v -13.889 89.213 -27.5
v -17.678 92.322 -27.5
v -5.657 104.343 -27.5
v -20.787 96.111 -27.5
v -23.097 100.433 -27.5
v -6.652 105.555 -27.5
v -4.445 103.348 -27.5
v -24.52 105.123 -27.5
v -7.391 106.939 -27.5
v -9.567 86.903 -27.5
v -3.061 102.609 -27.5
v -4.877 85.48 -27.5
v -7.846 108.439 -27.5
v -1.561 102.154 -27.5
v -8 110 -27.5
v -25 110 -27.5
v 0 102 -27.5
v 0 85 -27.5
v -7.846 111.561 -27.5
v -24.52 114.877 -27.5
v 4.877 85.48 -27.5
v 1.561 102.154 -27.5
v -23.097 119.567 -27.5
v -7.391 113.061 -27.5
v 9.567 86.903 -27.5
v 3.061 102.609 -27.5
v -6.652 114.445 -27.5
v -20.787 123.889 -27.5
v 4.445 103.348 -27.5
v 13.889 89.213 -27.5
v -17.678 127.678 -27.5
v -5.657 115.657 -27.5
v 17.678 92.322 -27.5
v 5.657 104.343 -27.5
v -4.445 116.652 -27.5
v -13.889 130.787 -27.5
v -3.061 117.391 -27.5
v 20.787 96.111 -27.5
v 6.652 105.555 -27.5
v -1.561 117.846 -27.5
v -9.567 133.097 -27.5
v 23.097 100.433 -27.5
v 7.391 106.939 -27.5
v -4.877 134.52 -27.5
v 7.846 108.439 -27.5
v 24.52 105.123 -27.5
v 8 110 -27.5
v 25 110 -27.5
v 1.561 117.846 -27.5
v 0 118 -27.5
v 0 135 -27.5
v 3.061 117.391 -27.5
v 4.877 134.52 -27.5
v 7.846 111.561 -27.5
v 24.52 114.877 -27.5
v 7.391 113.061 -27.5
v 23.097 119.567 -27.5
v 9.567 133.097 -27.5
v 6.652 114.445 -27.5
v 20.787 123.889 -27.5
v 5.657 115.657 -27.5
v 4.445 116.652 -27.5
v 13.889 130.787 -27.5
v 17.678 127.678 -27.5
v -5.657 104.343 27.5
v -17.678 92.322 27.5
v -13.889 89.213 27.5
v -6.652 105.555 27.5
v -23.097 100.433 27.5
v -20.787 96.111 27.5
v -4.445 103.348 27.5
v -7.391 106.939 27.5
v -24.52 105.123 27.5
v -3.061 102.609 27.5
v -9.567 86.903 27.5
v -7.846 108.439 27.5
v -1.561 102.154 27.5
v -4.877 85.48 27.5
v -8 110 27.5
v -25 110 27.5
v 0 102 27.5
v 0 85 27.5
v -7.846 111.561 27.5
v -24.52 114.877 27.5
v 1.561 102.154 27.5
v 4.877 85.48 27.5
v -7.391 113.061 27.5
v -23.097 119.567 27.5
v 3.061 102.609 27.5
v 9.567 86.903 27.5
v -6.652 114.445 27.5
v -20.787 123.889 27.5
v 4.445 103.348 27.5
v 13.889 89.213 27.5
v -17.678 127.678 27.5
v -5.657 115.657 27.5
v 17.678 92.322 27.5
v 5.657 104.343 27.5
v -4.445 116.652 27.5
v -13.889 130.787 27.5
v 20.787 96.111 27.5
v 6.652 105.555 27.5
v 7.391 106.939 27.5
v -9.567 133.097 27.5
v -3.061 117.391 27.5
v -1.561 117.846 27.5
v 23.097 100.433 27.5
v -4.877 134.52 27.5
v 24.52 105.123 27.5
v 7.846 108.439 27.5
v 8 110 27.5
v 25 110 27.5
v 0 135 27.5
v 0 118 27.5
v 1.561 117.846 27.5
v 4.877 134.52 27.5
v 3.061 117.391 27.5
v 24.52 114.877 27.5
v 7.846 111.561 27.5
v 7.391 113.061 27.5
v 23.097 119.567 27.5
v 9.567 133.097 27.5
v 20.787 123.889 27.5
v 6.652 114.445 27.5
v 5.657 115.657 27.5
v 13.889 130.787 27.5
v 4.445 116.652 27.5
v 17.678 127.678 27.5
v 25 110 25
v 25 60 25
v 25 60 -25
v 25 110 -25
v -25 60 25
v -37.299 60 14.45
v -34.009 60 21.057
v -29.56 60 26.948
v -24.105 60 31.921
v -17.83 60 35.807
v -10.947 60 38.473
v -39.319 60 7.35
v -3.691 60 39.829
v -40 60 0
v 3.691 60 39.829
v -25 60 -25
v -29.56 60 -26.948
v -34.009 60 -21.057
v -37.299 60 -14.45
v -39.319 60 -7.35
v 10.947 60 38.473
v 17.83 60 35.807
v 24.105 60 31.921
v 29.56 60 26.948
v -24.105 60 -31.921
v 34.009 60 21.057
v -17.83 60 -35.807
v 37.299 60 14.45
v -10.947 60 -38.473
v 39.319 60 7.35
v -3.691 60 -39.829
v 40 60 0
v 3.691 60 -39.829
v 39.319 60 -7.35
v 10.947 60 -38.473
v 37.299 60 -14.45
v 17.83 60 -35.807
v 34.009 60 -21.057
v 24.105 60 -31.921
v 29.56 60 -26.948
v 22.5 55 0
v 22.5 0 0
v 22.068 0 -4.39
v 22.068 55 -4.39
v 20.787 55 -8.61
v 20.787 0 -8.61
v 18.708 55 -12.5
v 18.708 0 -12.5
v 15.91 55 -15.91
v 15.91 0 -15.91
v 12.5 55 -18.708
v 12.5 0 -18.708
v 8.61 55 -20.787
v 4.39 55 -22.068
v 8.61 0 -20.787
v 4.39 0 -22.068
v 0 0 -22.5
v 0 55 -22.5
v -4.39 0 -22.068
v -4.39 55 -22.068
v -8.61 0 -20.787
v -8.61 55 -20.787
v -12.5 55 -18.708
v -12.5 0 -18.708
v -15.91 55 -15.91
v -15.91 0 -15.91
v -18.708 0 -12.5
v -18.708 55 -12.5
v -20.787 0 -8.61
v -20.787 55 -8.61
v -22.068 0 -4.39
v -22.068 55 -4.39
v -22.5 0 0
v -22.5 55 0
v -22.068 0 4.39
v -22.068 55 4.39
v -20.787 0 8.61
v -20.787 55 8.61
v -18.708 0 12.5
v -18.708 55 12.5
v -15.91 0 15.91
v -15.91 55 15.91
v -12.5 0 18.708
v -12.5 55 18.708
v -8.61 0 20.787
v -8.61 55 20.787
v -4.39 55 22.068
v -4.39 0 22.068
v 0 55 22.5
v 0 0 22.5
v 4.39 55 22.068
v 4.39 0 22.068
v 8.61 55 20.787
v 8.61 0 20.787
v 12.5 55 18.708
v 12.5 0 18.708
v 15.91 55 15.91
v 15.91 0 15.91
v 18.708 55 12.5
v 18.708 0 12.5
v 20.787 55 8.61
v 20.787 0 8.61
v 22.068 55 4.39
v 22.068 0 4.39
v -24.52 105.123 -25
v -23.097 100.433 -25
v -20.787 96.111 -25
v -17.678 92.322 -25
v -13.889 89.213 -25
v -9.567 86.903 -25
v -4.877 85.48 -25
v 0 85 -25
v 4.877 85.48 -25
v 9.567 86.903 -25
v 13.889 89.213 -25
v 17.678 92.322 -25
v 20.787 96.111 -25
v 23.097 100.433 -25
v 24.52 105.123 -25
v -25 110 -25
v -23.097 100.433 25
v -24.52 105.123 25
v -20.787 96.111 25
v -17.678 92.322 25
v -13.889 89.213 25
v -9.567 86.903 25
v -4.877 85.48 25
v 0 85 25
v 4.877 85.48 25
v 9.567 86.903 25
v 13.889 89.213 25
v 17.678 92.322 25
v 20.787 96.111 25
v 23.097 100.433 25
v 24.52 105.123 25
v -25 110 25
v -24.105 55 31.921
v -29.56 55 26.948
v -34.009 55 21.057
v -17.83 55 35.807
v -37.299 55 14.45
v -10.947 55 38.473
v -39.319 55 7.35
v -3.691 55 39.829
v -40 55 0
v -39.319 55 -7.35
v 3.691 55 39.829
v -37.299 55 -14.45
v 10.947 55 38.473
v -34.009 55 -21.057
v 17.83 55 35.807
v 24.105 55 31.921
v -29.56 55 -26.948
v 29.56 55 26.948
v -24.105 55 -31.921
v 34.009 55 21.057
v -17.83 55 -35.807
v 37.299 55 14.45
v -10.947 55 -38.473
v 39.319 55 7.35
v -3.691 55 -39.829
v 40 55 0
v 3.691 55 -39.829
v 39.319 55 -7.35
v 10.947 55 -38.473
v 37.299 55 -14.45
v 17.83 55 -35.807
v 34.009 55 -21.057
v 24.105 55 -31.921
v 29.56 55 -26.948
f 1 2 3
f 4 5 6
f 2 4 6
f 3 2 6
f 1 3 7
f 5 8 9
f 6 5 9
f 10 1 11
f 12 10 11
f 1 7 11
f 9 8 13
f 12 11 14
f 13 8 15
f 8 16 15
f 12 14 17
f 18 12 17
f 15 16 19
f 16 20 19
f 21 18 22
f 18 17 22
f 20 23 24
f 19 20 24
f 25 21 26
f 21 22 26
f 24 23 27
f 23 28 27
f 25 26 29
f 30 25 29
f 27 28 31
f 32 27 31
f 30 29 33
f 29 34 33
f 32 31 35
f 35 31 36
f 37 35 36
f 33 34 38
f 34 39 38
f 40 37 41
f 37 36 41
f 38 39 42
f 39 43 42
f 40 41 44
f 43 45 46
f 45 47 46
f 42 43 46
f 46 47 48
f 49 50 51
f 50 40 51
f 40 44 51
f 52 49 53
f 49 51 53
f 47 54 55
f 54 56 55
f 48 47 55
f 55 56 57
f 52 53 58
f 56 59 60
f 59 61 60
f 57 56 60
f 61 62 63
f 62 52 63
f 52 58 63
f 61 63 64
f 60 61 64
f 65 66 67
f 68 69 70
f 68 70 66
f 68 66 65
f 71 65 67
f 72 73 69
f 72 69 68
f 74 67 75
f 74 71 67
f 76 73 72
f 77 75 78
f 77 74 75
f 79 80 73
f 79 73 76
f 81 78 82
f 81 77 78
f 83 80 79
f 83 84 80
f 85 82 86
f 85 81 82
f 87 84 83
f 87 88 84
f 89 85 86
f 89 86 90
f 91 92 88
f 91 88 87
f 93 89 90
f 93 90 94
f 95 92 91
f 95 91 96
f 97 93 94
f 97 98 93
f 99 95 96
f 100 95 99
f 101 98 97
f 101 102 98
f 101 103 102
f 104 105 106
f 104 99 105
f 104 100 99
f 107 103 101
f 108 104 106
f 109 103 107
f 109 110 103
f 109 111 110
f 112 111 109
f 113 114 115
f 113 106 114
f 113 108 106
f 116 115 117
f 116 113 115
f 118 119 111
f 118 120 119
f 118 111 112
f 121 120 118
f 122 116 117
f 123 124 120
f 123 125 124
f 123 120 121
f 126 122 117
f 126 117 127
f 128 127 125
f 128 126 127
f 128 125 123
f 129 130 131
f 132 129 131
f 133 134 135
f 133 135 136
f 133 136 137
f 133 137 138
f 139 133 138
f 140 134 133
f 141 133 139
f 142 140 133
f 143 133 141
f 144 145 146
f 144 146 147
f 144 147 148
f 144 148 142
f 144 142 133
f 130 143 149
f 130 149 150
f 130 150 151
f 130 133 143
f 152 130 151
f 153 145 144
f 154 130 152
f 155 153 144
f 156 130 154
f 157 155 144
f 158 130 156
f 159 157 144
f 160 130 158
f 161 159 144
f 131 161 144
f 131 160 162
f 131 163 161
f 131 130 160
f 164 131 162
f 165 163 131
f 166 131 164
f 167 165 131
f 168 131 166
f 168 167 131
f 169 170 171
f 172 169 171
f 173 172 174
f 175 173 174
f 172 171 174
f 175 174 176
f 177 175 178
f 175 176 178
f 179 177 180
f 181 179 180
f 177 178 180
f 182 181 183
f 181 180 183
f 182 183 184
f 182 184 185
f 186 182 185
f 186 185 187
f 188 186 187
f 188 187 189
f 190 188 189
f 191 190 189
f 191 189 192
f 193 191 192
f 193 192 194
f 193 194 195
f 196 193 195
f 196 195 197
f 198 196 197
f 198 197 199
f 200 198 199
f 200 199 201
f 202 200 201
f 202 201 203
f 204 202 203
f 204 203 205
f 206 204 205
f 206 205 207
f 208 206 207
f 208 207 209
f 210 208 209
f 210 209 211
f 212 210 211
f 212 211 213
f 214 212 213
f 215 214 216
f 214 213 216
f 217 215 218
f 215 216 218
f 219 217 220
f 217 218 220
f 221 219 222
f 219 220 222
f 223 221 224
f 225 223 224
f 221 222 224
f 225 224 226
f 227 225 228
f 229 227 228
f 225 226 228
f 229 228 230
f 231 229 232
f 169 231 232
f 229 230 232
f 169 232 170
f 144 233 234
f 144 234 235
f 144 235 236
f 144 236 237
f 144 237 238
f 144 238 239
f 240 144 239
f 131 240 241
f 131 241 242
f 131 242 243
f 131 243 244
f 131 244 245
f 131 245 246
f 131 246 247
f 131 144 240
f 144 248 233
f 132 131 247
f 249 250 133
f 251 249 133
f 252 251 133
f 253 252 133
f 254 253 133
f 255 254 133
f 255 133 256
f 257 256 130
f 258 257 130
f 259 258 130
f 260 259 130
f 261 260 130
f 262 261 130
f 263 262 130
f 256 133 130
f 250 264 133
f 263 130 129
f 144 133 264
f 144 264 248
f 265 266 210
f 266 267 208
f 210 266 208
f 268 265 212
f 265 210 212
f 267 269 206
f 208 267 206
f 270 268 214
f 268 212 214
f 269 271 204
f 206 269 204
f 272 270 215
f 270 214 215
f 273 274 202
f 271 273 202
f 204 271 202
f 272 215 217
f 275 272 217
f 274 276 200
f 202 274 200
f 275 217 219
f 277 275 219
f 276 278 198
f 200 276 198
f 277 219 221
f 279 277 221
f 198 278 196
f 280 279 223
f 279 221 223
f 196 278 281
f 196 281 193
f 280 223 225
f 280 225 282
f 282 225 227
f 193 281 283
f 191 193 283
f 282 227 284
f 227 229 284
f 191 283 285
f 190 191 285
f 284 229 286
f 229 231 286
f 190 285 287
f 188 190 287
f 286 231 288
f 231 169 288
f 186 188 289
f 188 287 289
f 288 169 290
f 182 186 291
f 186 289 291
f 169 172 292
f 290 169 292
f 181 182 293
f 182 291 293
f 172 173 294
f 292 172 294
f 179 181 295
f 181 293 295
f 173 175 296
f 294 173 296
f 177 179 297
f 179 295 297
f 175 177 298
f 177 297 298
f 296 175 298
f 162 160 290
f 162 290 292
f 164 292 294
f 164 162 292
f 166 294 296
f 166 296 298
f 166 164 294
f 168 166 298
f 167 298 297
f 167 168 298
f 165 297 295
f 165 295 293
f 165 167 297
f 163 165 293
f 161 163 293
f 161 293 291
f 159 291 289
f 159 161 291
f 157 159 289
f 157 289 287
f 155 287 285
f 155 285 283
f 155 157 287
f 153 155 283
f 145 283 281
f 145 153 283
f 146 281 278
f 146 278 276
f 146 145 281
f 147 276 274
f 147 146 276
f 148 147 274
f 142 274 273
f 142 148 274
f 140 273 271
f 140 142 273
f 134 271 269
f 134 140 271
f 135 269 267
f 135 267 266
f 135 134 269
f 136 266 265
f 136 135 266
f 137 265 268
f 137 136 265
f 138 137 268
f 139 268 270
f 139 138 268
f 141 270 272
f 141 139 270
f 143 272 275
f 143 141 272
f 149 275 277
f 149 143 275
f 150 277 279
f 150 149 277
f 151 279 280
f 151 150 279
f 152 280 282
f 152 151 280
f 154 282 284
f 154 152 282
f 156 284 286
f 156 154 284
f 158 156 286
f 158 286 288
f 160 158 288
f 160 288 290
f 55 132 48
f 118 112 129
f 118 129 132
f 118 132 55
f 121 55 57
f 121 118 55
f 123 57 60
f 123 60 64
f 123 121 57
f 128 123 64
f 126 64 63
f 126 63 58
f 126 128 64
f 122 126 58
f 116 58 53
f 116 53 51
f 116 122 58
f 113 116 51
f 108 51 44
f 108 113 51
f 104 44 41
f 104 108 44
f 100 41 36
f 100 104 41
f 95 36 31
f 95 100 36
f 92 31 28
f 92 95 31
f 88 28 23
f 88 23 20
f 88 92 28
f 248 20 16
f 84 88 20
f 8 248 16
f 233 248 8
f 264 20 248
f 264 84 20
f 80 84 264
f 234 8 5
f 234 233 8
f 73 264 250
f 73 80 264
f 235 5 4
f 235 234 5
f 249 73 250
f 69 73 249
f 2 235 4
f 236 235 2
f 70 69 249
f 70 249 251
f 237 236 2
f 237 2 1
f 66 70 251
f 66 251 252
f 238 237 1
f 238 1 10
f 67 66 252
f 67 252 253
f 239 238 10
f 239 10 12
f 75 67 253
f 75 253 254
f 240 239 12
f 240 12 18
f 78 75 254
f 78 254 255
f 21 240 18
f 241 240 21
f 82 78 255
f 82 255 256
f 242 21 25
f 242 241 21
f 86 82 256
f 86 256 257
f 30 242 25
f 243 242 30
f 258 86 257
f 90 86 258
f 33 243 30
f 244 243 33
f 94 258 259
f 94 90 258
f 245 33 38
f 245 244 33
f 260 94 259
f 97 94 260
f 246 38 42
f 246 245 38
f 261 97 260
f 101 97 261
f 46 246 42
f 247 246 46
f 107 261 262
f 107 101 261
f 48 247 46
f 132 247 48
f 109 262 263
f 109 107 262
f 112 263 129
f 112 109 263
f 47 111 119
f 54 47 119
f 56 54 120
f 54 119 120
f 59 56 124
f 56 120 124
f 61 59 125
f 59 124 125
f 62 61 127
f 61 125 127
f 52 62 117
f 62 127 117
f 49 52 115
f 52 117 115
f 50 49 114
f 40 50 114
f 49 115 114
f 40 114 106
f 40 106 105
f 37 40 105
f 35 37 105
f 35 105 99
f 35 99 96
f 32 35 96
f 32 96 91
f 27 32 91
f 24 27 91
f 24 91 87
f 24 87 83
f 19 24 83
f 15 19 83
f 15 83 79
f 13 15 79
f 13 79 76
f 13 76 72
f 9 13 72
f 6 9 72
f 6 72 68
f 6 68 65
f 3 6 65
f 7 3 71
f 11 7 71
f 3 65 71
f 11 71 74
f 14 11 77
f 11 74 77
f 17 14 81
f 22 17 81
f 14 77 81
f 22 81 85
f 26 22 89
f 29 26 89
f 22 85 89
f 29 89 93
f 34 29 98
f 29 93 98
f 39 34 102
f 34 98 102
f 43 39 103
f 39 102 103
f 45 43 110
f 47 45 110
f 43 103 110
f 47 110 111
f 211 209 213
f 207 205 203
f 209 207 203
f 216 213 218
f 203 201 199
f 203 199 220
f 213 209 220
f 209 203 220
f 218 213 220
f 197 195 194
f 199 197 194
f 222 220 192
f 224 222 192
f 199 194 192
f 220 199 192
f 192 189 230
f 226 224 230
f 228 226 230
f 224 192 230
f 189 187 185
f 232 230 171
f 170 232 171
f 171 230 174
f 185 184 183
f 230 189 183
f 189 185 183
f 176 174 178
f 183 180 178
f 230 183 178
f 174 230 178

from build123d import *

# Parameters (mm, degrees)
IZIM1_R                     = 22.5
Y_KSEKLIK_EKSTR_ZYON1_DEPTH = 60
IZIM2_R                     = 40
IZIM2_R_2                   = 22.5
Y_KSEKLIK_EKSTR_ZYON2_DEPTH = 5
IZIM3_W                     = 50
IZIM3_H                     = 50
Y_KSEKLIK_EKSTR_ZYON3_DEPTH = 50
IZIM4_R                     = 25
Y_KSEKLIK_EKSTR_ZYON4_DEPTH = 27.5
IZIM5_R                     = 8
KES_EKSTR_ZYON1_DEPTH       = 68.5


with BuildPart() as part:
    # Çizim1 → Yükseklik-Ekstrüzyon1 (new body)
    with BuildSketch(Plane(origin=(0, 0, 0), x_dir=(1, 0, 0), z_dir=(0, 1, 0))):
        Circle(IZIM1_R)
    extrude(amount=Y_KSEKLIK_EKSTR_ZYON1_DEPTH)

    # Çizim2 → Yükseklik-Ekstrüzyon2 (add)
    with BuildSketch(Plane(origin=(0, 60, 0), x_dir=(1, 0, 0), z_dir=(0, 1, 0))):
        Circle(IZIM2_R)
        Circle(IZIM2_R_2, mode=Mode.SUBTRACT)
    extrude(amount=-Y_KSEKLIK_EKSTR_ZYON2_DEPTH)

    # Çizim3 → Yükseklik-Ekstrüzyon3 (add)
    with BuildSketch(Plane(origin=(0, 60, 0), x_dir=(1, 0, 0), z_dir=(0, 1, 0))):
        Rectangle(IZIM3_W, IZIM3_H)
    extrude(amount=Y_KSEKLIK_EKSTR_ZYON3_DEPTH)

    # Çizim4 → Yükseklik-Ekstrüzyon4 (add, symmetric)
    with BuildSketch(Plane.XY):
        with Locations((0, 110)):
            Circle(IZIM4_R)
    extrude(amount=Y_KSEKLIK_EKSTR_ZYON4_DEPTH, both=True)

    # Çizim5 → Kes-Ekstrüzyon1 (cut, through all)
    with BuildSketch(Plane.XY.offset(27.5)):
        with Locations((0, 110)):
            Circle(IZIM5_R)
    extrude(amount=-KES_EKSTR_ZYON1_DEPTH, mode=Mode.SUBTRACT)


solid = part.part
